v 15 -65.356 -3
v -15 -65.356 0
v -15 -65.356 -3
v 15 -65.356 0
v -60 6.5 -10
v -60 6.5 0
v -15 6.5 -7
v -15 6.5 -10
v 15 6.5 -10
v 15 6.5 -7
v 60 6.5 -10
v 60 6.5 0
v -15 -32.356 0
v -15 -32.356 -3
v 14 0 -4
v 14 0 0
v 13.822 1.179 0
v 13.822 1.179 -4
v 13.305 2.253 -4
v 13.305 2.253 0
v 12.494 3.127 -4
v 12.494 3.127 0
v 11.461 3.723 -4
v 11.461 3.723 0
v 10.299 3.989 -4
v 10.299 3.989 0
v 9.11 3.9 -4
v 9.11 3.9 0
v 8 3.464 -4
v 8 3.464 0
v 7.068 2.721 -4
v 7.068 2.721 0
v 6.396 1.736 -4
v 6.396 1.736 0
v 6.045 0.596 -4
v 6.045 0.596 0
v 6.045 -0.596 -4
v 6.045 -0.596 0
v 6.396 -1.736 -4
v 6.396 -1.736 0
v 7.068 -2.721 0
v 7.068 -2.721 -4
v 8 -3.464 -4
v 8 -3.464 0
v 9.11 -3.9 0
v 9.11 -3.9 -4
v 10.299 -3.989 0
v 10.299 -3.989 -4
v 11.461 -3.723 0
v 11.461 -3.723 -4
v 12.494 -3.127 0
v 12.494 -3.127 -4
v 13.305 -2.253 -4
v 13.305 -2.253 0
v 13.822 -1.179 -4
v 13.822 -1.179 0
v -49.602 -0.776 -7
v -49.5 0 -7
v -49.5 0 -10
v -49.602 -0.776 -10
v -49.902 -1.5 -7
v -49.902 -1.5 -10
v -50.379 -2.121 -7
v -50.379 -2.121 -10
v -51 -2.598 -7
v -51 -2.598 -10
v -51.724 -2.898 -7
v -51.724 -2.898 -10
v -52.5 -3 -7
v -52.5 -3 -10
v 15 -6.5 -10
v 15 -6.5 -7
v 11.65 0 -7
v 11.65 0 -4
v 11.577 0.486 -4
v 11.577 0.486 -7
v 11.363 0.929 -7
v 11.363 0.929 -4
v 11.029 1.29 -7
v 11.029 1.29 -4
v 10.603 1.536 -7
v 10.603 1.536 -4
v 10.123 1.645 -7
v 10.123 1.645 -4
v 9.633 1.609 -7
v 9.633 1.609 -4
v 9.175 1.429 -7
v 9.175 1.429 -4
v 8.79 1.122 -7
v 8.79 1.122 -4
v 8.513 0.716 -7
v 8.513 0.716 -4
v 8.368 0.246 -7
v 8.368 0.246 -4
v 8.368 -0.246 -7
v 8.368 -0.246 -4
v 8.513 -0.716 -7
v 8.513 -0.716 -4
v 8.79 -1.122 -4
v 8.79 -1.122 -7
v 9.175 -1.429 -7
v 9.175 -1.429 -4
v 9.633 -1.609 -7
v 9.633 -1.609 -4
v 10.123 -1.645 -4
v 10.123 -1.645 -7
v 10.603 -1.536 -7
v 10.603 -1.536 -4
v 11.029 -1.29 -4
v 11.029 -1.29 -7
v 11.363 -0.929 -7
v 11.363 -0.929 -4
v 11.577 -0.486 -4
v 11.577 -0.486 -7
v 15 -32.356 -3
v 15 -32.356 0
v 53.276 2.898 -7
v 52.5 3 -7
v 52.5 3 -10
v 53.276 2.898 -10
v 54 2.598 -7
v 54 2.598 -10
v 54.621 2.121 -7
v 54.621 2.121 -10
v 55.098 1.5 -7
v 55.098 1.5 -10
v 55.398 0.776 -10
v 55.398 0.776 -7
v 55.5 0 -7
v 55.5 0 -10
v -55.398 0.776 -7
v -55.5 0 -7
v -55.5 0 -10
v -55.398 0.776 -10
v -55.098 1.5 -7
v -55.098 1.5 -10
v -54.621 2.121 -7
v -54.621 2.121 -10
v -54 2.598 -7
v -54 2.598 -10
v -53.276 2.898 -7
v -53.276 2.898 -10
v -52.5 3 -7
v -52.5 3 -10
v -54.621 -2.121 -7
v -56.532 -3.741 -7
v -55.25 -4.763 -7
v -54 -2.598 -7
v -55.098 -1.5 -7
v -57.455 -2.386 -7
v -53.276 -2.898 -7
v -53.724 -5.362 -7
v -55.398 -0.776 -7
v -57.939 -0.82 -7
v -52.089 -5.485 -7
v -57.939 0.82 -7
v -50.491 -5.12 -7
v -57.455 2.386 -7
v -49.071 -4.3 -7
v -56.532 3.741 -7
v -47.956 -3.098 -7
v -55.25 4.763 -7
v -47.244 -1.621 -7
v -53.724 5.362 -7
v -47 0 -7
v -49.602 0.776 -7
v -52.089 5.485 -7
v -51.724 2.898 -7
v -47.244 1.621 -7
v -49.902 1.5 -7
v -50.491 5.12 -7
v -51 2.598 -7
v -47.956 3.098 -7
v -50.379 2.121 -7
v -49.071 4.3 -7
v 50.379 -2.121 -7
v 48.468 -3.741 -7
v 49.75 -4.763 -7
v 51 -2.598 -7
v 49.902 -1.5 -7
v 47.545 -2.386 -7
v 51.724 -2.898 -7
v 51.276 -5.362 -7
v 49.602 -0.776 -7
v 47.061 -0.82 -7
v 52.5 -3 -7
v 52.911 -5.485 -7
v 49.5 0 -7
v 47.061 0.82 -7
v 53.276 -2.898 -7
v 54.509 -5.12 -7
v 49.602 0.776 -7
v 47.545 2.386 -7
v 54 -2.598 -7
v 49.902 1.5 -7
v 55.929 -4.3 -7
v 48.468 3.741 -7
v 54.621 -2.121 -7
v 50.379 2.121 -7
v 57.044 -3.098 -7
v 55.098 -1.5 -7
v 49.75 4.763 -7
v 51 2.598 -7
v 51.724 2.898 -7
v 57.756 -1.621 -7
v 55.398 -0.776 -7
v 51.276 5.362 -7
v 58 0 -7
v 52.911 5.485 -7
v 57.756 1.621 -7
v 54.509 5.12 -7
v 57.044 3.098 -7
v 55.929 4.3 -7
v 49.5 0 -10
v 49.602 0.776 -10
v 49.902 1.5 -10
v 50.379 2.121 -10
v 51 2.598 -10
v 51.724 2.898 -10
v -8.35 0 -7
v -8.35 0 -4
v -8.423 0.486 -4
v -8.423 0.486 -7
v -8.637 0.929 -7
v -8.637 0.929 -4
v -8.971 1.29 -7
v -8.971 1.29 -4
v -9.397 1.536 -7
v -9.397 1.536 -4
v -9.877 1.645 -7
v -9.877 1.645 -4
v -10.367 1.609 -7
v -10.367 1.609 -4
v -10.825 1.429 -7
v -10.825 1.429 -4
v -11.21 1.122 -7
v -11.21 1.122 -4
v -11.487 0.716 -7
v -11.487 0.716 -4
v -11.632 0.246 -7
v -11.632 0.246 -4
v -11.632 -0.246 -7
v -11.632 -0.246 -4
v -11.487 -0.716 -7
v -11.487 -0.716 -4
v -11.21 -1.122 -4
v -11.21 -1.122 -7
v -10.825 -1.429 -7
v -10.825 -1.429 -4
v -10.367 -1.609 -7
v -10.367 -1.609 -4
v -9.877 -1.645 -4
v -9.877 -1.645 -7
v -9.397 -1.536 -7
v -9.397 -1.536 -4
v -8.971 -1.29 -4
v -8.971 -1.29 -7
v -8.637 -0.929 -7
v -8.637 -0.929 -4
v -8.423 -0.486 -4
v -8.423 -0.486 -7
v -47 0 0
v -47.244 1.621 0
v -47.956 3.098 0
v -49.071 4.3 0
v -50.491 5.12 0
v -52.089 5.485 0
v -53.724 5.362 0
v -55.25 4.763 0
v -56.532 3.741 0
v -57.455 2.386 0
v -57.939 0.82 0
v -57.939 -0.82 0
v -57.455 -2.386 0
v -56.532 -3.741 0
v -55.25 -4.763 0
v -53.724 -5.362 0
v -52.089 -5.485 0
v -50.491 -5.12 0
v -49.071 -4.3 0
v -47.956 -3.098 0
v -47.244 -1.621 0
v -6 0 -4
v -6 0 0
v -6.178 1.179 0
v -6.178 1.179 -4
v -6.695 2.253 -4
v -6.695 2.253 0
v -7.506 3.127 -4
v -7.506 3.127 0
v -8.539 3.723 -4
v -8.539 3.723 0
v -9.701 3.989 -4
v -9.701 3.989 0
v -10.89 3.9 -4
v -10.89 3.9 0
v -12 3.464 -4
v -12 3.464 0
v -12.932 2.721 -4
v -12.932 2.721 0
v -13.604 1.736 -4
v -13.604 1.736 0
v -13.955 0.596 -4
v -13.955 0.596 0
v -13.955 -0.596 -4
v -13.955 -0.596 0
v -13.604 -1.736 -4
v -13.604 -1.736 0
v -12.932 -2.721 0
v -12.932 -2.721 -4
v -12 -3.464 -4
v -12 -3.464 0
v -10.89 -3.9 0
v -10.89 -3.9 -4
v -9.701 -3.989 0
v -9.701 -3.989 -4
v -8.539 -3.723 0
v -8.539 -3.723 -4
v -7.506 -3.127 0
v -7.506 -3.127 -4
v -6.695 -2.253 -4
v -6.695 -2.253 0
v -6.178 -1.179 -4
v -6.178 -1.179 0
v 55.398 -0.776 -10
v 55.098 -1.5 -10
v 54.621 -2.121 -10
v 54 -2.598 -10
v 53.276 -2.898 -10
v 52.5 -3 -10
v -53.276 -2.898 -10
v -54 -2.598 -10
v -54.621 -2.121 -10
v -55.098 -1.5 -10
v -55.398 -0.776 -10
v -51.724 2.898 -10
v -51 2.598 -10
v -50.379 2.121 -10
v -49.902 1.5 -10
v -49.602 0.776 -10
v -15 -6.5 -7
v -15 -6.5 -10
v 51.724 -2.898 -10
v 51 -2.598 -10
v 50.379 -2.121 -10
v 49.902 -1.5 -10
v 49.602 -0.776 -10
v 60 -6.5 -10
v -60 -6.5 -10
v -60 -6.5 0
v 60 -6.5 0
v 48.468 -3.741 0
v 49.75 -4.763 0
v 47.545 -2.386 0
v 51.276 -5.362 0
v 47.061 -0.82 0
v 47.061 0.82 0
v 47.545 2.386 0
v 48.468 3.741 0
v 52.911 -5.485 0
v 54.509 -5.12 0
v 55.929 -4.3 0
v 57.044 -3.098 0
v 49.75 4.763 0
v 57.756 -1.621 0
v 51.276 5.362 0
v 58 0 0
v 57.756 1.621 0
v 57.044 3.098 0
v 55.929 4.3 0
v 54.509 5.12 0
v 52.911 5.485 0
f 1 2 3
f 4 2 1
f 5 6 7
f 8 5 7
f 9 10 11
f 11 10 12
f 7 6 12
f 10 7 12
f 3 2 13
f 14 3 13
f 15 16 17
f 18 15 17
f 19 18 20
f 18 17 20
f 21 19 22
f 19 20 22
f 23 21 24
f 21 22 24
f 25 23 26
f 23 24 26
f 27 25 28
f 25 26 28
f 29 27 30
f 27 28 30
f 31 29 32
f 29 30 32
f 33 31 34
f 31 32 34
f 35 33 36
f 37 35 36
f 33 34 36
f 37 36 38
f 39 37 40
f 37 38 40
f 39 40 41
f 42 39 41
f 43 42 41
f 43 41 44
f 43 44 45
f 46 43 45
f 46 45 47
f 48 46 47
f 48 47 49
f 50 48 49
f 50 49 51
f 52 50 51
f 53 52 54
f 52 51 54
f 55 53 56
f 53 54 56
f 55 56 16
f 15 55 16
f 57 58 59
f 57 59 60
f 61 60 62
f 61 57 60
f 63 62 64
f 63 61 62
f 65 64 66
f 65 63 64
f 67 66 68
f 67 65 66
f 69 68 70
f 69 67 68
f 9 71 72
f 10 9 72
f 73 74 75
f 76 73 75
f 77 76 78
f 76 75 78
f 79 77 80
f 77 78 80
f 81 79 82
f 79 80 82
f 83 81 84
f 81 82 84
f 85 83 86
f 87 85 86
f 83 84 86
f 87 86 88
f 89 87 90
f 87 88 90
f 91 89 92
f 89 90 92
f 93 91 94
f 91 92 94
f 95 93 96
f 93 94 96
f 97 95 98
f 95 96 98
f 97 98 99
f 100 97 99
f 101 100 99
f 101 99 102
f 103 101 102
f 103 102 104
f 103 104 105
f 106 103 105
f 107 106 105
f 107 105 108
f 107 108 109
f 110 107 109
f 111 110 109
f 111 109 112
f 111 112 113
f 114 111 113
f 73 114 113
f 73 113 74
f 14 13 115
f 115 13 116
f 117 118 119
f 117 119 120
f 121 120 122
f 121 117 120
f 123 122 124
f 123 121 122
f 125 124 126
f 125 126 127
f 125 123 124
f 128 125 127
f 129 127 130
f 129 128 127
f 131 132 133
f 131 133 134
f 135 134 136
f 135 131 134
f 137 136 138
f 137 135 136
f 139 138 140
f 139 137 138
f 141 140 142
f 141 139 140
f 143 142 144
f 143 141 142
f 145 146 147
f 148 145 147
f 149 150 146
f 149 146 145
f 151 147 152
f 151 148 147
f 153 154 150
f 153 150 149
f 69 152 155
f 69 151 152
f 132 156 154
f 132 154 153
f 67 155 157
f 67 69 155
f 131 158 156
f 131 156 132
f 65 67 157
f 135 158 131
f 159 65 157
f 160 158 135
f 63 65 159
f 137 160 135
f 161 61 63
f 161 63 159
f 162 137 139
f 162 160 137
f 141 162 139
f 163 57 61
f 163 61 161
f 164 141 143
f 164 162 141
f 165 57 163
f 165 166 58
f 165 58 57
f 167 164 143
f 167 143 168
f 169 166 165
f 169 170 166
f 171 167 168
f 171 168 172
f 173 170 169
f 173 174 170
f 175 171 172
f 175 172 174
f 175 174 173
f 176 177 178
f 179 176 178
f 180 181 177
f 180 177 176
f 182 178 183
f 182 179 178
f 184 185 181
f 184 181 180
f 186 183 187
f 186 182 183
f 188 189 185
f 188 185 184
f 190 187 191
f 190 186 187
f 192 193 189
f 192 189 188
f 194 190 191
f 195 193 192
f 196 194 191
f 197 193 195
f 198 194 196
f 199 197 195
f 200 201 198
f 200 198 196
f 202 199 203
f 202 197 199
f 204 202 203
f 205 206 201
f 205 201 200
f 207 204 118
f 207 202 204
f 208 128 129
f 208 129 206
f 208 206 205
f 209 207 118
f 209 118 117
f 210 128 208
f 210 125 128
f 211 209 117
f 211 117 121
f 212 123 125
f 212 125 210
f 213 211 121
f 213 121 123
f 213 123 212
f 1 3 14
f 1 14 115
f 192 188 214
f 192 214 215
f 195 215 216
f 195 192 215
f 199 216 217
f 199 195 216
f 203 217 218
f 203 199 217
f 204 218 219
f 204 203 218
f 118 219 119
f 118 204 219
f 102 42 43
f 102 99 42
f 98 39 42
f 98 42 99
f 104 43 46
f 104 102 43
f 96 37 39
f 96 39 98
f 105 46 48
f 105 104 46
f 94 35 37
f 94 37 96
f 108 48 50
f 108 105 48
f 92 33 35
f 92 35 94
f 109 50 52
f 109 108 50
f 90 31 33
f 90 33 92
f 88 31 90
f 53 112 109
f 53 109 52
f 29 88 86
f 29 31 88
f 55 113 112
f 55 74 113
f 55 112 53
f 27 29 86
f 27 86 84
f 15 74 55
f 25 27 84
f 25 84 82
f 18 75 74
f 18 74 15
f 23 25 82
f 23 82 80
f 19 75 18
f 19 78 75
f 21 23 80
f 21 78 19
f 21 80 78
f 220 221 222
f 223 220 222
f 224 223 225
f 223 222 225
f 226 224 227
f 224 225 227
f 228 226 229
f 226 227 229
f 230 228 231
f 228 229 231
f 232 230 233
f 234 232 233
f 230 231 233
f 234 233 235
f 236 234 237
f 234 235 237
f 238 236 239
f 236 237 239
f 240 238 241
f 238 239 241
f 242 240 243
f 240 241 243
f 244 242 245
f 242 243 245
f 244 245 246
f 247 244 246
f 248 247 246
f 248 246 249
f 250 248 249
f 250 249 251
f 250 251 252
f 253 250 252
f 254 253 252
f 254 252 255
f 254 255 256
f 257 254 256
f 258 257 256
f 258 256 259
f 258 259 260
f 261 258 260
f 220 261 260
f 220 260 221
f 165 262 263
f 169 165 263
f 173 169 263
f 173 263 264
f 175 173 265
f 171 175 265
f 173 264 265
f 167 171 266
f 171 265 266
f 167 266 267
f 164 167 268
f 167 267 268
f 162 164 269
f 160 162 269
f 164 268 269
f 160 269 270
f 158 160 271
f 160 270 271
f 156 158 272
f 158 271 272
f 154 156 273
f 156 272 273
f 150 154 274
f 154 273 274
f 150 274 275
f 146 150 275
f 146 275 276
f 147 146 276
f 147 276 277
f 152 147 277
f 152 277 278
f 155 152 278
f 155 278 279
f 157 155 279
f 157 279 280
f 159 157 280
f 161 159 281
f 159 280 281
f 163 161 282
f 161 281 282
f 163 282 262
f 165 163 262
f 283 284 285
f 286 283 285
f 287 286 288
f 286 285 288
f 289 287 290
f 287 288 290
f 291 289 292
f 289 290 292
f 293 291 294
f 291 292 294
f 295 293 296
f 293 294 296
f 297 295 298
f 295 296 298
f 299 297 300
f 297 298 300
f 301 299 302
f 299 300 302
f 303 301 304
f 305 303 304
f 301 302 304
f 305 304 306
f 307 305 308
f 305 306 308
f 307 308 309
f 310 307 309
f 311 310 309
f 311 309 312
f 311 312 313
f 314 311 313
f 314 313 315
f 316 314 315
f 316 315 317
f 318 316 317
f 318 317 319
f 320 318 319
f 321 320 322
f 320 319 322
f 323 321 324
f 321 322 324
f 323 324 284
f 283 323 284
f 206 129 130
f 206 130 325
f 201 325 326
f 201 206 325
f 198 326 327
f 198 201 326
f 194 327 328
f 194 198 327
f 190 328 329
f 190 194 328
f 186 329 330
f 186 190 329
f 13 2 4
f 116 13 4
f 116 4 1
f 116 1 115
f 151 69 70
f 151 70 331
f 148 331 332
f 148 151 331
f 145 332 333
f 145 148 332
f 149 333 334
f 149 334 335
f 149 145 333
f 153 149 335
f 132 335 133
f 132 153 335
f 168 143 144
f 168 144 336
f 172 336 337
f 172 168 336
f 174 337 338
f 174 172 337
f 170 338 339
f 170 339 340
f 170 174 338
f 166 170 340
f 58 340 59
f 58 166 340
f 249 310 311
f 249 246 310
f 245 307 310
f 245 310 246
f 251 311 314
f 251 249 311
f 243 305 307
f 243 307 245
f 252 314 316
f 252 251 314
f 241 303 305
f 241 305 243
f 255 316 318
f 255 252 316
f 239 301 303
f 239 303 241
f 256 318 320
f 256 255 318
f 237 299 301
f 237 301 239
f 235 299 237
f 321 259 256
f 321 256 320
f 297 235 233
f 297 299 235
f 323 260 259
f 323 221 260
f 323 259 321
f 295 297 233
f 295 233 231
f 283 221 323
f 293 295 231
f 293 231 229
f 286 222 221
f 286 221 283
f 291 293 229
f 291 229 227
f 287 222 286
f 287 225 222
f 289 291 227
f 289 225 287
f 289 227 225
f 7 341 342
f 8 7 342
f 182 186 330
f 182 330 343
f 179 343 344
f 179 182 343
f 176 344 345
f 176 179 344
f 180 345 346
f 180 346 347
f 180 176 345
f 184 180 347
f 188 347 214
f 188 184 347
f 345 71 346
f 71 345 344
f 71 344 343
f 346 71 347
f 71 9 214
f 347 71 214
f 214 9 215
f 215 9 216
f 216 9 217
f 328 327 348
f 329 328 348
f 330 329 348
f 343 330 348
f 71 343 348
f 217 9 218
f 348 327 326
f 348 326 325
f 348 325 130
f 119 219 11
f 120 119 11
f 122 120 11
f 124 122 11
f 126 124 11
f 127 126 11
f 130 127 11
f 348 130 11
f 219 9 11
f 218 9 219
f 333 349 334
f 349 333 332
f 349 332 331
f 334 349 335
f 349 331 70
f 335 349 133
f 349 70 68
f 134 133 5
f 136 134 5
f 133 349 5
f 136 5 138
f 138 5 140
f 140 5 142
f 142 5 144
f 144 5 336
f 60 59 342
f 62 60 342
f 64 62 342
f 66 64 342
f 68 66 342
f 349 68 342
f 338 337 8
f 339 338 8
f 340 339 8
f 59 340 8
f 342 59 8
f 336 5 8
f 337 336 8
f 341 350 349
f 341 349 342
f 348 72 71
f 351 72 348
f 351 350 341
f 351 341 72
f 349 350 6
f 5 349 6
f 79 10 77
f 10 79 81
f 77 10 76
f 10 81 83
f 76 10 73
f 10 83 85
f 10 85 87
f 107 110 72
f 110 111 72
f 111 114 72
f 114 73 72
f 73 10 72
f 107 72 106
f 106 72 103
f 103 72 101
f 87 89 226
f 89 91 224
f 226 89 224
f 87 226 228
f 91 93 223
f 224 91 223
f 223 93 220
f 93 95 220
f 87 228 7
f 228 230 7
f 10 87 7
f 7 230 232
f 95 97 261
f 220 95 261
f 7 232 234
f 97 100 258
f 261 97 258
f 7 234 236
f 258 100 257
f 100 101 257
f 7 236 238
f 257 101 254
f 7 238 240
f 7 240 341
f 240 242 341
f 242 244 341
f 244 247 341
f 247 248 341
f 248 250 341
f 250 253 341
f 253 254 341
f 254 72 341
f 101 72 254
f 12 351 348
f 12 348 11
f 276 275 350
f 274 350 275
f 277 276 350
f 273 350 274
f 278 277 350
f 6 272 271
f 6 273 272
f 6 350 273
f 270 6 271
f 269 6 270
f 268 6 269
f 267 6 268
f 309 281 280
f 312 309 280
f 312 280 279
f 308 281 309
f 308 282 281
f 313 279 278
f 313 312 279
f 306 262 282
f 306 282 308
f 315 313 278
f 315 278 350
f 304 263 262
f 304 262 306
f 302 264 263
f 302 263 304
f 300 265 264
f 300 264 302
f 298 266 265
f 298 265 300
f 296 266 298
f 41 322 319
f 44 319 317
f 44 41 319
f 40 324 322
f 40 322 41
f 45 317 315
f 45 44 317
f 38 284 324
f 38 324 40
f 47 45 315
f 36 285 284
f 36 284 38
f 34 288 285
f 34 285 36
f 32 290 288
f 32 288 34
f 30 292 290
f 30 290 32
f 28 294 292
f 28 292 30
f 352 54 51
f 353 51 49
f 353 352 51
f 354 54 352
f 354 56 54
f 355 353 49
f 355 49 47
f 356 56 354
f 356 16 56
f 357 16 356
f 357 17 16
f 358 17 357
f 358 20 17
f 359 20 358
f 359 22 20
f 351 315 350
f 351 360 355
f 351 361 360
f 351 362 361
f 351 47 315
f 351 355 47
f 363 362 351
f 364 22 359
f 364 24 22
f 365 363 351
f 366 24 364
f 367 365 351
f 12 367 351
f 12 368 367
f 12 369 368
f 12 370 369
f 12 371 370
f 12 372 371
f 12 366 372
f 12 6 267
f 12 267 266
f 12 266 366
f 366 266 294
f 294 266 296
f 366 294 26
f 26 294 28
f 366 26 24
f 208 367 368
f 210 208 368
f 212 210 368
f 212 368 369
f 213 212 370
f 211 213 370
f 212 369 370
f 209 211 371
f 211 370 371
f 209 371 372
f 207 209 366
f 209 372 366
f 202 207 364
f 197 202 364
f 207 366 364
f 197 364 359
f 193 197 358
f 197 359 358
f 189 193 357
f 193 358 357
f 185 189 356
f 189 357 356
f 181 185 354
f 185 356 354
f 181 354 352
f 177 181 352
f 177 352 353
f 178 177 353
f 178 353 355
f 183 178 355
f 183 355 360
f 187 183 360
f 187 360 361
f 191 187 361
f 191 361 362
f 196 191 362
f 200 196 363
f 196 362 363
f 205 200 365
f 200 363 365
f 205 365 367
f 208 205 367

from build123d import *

# Parameters (mm, degrees)
F0_W     = 120
F0_H     = 13
F0_R     = 5.5
F0_R_2   = 4
F0_R_3   = 1.65
F1_DEPTH = 10
F2_DEPTH = 7
F4_DEPTH = 25
F5_DEPTH = 4
F0_W_2   = 30
F0_H_2   = 33
F6_DEPTH = 3


# Not quite as in the source:
# - a feature names something its author has since deleted; it is built from what else it names


with BuildPart() as f1:
    # F0 (on Top) → F1 (new body)
    with BuildSketch(Plane.XY):
        Rectangle(F0_W, F0_H)
        with Locations((-52.5, 0)):
            Circle(F0_R, mode=Mode.SUBTRACT)
        with Locations((-10, 0)):
            Circle(F0_R_2, mode=Mode.SUBTRACT)
        with Locations((10, 0)):
            Circle(F0_R_2, mode=Mode.SUBTRACT)
        with Locations((52.5, 0)):
            Circle(F0_R, mode=Mode.SUBTRACT)
        with Locations((-52.5, 0)):
            Circle(F0_R)
        with BuildLine():
            ThreePointArc((-55.5, 0), (-54.6213203436, 2.1213203436), (-52.5, 3))
            ThreePointArc((-52.5, 3), (-50.3786796564, 2.1213203436), (-49.5, 0))
            ThreePointArc((-49.5, 0), (-50.3786796564, -2.1213203436), (-52.5, -3))
            ThreePointArc((-52.5, -3), (-54.6213203436, -2.1213203436), (-55.5, 0))
        make_face(mode=Mode.SUBTRACT)
        with Locations((52.5, 0)):
            Circle(F0_R)
        with BuildLine():
            ThreePointArc((52.5, 3), (54.6213203436, 2.1213203436), (55.5, 0))
            ThreePointArc((55.5, 0), (54.6213203436, -2.1213203436), (52.5, -3))
            ThreePointArc((52.5, -3), (50.3786796564, -2.1213203436), (49.5, 0))
            ThreePointArc((49.5, 0), (50.3786796564, 2.1213203436), (52.5, 3))
        make_face(mode=Mode.SUBTRACT)
        with Locations((-10, 0)):
            Circle(F0_R_2)
        with Locations((-10, 0)):
            Circle(F0_R_3, mode=Mode.SUBTRACT)
        with Locations((10, 0)):
            Circle(F0_R_2)
        with Locations((10, 0)):
            Circle(F0_R_3, mode=Mode.SUBTRACT)
    extrude(amount=-F1_DEPTH)

    # F0 (on Top) → F2 (cut)
    with BuildSketch(Plane.XY):
        with Locations((-52.5, 0)):
            Circle(F0_R)
        with BuildLine():
            ThreePointArc((-55.5, 0), (-54.6213203436, 2.1213203436), (-52.5, 3))
            ThreePointArc((-52.5, 3), (-50.3786796564, 2.1213203436), (-49.5, 0))
            ThreePointArc((-49.5, 0), (-50.3786796564, -2.1213203436), (-52.5, -3))
            ThreePointArc((-52.5, -3), (-54.6213203436, -2.1213203436), (-55.5, 0))
        make_face(mode=Mode.SUBTRACT)
        with Locations((52.5, 0)):
            Circle(F0_R)
        with BuildLine():
            ThreePointArc((52.5, 3), (54.6213203436, 2.1213203436), (55.5, 0))
            ThreePointArc((55.5, 0), (54.6213203436, -2.1213203436), (52.5, -3))
            ThreePointArc((52.5, -3), (50.3786796564, -2.1213203436), (49.5, 0))
            ThreePointArc((49.5, 0), (50.3786796564, 2.1213203436), (52.5, 3))
        make_face(mode=Mode.SUBTRACT)
    extrude(amount=-F2_DEPTH, mode=Mode.SUBTRACT)

    # F3 (on face) → F4 (cut)
    with BuildSketch(Plane.XZ.offset(6.5)):
        Polygon((-15, -10), (0, -10), (15, -10), (15, -7), (0, -7), (-15, -7), align=None)
    extrude(amount=-F4_DEPTH, mode=Mode.SUBTRACT)

    # F0 (on Top) → F5 (cut)
    with BuildSketch(Plane.XY):
        with Locations((-10, 0)):
            Circle(F0_R_2)
        with Locations((-10, 0)):
            Circle(F0_R_3, mode=Mode.SUBTRACT)
        with Locations((10, 0)):
            Circle(F0_R_2)
        with Locations((10, 0)):
            Circle(F0_R_3, mode=Mode.SUBTRACT)
    extrude(amount=-F5_DEPTH, mode=Mode.SUBTRACT)


with BuildPart() as f6:
    # F0 (on Top) → F6 (new body)
    with BuildSketch(Plane.XY):
        with Locations((0, -48.8559566438)):
            Rectangle(F0_W_2, F0_H_2)
    extrude(amount=-F6_DEPTH)


solid = Compound([f1.part, f6.part])
